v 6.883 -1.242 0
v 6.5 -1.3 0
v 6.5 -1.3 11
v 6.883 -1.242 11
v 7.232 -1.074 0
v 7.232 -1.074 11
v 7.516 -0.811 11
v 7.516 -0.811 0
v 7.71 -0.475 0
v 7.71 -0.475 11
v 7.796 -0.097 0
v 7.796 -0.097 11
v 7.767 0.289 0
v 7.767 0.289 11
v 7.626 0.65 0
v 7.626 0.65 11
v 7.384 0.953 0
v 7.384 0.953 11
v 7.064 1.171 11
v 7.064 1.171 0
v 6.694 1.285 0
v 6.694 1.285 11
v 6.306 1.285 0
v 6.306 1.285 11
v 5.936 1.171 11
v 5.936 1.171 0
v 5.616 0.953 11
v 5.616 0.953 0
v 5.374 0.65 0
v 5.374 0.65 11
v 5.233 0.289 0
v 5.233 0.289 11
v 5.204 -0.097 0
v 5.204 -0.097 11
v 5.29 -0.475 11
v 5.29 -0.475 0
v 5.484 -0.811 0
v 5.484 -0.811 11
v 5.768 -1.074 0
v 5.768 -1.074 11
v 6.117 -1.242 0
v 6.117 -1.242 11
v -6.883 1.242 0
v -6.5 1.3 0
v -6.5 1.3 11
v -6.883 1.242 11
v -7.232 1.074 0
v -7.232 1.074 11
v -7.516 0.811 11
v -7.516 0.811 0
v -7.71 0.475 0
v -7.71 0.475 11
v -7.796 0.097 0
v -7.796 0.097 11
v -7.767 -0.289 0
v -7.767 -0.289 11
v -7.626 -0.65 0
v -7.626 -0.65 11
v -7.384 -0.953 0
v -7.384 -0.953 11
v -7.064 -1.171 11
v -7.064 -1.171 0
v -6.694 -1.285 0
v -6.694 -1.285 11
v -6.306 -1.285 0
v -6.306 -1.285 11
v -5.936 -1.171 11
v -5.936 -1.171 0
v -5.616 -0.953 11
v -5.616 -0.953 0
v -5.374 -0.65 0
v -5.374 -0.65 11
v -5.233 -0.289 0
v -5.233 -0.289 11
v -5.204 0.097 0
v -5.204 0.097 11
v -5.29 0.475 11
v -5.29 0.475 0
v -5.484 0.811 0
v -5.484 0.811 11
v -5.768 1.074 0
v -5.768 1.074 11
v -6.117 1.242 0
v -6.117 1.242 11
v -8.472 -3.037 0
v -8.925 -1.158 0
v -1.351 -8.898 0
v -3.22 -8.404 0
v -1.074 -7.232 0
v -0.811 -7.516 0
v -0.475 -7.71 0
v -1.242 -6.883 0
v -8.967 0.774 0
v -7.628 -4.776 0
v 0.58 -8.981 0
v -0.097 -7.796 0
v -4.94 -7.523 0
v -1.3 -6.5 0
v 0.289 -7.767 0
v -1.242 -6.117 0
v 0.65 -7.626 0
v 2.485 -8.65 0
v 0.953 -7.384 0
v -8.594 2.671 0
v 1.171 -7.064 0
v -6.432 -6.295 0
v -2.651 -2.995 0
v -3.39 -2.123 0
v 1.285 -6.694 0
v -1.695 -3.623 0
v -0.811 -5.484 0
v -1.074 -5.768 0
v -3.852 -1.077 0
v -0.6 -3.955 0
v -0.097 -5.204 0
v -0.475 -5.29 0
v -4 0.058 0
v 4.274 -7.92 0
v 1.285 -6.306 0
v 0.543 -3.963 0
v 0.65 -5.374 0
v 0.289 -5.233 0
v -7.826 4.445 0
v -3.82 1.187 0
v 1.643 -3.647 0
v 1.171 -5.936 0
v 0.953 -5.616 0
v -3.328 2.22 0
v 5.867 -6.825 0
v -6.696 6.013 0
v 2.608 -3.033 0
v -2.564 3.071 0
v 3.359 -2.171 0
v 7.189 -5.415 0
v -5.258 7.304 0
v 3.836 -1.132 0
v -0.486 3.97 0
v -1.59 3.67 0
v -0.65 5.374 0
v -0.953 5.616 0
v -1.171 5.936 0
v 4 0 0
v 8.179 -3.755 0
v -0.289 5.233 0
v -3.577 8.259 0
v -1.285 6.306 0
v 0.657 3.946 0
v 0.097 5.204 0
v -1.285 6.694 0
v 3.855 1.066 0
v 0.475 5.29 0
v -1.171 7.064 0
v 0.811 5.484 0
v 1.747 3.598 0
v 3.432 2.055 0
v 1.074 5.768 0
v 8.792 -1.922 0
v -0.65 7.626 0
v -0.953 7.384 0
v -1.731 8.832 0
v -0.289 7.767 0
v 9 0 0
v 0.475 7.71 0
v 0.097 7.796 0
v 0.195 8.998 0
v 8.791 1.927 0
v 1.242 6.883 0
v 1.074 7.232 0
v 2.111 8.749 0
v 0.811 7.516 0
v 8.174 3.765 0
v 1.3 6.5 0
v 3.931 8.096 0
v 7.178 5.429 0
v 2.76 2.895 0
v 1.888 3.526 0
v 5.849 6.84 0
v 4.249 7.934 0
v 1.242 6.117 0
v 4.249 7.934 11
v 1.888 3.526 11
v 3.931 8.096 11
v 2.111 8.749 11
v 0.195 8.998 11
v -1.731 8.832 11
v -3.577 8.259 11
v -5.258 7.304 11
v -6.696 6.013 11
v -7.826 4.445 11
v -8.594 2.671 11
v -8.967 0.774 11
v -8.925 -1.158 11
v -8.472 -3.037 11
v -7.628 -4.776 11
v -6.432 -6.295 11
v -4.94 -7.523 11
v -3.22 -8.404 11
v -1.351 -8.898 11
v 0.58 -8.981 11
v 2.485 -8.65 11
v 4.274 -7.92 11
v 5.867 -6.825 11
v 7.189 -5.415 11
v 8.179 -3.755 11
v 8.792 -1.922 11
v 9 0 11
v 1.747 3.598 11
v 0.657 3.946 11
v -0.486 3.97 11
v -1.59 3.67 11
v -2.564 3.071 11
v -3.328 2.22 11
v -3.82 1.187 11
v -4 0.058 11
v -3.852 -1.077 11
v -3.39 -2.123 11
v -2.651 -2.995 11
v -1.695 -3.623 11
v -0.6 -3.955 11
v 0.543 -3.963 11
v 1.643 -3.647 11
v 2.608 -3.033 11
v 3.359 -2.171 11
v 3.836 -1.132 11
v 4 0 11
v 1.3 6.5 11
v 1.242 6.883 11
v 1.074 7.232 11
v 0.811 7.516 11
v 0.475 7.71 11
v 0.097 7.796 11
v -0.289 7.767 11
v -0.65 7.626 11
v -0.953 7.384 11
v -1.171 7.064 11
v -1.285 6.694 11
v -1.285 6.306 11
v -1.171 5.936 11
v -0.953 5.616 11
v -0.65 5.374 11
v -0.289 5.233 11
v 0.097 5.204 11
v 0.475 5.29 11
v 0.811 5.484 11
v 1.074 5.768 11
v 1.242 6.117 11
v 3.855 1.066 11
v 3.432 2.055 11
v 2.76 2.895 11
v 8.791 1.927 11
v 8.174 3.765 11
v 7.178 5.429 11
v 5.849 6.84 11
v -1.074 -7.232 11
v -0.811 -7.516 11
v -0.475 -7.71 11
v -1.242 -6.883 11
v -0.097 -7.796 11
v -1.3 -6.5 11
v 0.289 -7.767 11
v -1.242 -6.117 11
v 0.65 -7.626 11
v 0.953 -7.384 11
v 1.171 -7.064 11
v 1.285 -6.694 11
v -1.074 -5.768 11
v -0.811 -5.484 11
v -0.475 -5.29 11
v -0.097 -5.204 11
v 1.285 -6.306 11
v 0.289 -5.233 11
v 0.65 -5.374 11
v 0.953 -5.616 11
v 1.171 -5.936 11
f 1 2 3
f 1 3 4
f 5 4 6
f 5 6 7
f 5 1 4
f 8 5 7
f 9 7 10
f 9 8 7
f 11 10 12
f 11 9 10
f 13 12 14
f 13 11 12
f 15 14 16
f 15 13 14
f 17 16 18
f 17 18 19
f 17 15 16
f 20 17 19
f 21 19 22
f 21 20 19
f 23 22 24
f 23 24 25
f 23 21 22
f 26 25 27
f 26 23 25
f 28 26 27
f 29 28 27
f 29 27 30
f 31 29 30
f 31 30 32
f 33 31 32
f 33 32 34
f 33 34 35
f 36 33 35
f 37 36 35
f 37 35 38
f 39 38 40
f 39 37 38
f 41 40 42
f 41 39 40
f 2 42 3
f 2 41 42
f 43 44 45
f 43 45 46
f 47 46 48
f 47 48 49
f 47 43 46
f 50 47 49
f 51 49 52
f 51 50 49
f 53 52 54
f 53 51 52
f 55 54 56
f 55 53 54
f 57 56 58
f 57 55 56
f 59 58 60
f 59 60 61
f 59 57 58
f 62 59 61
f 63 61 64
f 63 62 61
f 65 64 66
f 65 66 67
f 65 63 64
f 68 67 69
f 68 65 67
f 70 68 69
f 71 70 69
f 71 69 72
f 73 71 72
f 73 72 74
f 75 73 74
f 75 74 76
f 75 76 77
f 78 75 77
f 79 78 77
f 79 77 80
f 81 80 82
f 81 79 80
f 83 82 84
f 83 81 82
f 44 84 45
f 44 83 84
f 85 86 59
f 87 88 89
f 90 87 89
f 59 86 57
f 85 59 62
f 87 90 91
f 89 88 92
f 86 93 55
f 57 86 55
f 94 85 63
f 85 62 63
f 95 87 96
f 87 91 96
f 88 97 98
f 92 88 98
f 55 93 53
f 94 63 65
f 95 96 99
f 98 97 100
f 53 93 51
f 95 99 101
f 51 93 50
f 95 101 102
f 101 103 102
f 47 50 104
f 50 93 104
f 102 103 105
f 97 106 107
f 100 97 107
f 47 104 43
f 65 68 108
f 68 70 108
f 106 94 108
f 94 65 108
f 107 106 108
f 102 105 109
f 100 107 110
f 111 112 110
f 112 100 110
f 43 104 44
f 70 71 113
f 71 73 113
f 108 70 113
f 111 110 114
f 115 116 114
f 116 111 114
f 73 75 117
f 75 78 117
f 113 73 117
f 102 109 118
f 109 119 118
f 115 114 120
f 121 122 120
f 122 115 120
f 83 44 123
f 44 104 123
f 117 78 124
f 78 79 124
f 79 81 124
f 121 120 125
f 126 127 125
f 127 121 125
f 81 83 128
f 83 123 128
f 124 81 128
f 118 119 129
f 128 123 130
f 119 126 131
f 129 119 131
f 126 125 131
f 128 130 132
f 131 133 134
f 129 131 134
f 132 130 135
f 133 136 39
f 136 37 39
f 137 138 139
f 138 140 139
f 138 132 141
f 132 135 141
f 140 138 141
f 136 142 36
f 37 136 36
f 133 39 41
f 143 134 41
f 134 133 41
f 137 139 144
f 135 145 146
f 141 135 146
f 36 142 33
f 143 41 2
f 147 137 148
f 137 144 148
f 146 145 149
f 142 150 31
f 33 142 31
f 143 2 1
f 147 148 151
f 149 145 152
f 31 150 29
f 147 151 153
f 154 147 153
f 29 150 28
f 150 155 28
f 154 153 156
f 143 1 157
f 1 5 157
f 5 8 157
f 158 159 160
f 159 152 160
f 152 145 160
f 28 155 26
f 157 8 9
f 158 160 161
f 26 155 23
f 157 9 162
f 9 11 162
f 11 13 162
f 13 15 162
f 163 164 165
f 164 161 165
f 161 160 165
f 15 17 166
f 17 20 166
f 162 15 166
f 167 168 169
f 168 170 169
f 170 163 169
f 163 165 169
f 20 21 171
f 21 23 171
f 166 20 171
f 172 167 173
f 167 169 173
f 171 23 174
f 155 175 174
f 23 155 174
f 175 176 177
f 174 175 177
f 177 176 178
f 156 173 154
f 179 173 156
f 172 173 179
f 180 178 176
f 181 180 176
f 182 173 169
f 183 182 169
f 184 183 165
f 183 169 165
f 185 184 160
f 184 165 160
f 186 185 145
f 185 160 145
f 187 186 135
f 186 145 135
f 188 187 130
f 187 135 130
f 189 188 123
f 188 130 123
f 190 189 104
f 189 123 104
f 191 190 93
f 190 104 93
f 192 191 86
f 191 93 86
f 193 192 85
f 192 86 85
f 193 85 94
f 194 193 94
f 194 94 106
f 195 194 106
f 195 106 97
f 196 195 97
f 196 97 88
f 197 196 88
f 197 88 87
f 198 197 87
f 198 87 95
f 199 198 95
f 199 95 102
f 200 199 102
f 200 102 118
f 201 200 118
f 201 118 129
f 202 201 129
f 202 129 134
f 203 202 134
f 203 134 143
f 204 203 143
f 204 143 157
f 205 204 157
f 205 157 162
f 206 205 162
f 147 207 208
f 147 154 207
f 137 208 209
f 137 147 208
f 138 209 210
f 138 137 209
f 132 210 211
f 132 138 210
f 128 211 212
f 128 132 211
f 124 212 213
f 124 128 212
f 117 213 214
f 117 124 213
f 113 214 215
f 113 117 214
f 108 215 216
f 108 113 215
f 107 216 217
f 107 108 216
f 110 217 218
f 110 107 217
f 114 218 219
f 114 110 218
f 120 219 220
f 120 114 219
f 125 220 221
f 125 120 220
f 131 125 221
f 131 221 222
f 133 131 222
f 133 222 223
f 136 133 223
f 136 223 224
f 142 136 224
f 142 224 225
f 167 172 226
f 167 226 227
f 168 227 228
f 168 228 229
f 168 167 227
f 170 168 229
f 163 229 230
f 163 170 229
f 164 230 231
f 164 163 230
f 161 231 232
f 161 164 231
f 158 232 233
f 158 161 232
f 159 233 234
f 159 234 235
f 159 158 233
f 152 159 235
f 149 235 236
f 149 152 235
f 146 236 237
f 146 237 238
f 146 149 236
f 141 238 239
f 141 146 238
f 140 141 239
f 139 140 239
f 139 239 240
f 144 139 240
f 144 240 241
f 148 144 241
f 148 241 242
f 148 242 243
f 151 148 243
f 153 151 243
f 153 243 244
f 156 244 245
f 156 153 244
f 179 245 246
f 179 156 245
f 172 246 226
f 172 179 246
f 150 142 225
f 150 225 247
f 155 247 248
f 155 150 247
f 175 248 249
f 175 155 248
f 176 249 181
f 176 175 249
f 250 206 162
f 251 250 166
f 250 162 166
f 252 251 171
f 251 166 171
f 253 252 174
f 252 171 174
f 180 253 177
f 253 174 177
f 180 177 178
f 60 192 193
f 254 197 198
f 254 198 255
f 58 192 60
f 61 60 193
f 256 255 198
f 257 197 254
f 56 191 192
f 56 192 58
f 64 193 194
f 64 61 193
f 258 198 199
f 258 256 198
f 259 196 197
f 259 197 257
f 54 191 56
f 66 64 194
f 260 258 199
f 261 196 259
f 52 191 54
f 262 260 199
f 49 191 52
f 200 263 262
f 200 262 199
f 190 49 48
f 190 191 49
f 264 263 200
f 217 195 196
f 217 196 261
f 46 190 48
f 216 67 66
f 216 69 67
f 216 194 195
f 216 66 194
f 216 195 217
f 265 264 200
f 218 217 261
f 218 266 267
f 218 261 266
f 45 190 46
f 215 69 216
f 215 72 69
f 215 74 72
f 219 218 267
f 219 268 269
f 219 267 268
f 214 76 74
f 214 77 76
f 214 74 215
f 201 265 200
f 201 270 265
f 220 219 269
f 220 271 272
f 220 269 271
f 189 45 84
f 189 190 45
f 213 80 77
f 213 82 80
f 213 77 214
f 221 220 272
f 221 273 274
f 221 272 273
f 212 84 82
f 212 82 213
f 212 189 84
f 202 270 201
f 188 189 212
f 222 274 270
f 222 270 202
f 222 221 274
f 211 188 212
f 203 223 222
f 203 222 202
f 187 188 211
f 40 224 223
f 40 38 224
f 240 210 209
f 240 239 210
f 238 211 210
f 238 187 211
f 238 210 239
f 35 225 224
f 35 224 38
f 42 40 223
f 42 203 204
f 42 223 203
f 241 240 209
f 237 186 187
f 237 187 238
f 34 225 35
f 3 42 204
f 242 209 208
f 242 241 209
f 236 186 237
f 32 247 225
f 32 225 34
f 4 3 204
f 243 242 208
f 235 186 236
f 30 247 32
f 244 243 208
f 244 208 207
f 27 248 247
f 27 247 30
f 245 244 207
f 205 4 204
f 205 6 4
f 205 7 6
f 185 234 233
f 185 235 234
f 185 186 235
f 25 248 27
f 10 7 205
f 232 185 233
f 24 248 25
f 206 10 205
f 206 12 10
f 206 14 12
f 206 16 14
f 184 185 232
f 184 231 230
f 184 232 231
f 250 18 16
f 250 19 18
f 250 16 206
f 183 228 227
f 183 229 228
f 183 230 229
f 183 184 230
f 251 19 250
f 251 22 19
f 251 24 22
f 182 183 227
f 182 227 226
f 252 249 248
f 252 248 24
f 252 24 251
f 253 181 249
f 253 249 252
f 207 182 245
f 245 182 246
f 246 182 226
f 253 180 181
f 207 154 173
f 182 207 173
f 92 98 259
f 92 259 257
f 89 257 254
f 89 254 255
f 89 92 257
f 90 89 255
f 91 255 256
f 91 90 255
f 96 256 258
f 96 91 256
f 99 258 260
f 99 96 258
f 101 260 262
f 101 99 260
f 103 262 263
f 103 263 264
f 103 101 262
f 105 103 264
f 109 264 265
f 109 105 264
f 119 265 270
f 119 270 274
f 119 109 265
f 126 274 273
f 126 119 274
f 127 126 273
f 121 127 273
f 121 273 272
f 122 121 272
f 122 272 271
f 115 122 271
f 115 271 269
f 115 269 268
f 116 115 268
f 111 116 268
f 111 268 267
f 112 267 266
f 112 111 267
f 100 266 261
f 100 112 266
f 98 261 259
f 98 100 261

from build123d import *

# Parameters (mm, degrees)
SKETCH_1_R               = 9
SKETCH_1_R_2             = 4
EXTRUDE_1_DEPTH          = 11
CUT_EXTRUDE_1_OUTLINE_R  = 1.3
CUT_EXTRUDE_1_DEPTH      = 11
PATTERN_CIRCULAR_1_COUNT = 4
CUT_EXTRUDE_2_DEPTH      = 17.822603841


# Read off the part's stored shape, not the designer's step: 切除-拉伸1
with BuildPart() as part:
    # 草图1 → 凸台-拉伸1 (new body)
    with BuildSketch(Plane.XY):
        Circle(SKETCH_1_R)
        Circle(SKETCH_1_R_2, mode=Mode.SUBTRACT)
    extrude(amount=EXTRUDE_1_DEPTH)

    # 切除-拉伸1 outline → 切除-拉伸1 (cut)
    with BuildSketch(Plane.XY):
        with Locations((0, 6.5)):
            Circle(CUT_EXTRUDE_1_OUTLINE_R)
    cut_extrude_1 = extrude(amount=CUT_EXTRUDE_1_DEPTH, mode=Mode.SUBTRACT)

    # 阵列(圆周)1: 切除-拉伸1 ×4 about axis
    pattern_circular_1_axis = Axis((0, 0, 0), (0, 0, 1))
    for i in range(1, PATTERN_CIRCULAR_1_COUNT):
        add(cut_extrude_1.rotate(pattern_circular_1_axis, i * 360 / PATTERN_CIRCULAR_1_COUNT), mode=Mode.SUBTRACT)

    # 草图6 → 切除-拉伸2 (cut, through all)
    with BuildSketch(Plane(origin=(0, 0, 0), x_dir=(-1, 0, 0), z_dir=(0, 0, -1))):
        with BuildLine():
            Line((-4.248676402, 7.934024756), (0, 0))
            Line((0, 0), (-3.930859643, 8.096193085))
            ThreePointArc((-3.930859643, 8.096193085), (-4.090571735, 8.016684033), (-4.248676402, 7.934024756))
        make_face()
    extrude(amount=-CUT_EXTRUDE_2_DEPTH, mode=Mode.SUBTRACT)


solid = part.part
